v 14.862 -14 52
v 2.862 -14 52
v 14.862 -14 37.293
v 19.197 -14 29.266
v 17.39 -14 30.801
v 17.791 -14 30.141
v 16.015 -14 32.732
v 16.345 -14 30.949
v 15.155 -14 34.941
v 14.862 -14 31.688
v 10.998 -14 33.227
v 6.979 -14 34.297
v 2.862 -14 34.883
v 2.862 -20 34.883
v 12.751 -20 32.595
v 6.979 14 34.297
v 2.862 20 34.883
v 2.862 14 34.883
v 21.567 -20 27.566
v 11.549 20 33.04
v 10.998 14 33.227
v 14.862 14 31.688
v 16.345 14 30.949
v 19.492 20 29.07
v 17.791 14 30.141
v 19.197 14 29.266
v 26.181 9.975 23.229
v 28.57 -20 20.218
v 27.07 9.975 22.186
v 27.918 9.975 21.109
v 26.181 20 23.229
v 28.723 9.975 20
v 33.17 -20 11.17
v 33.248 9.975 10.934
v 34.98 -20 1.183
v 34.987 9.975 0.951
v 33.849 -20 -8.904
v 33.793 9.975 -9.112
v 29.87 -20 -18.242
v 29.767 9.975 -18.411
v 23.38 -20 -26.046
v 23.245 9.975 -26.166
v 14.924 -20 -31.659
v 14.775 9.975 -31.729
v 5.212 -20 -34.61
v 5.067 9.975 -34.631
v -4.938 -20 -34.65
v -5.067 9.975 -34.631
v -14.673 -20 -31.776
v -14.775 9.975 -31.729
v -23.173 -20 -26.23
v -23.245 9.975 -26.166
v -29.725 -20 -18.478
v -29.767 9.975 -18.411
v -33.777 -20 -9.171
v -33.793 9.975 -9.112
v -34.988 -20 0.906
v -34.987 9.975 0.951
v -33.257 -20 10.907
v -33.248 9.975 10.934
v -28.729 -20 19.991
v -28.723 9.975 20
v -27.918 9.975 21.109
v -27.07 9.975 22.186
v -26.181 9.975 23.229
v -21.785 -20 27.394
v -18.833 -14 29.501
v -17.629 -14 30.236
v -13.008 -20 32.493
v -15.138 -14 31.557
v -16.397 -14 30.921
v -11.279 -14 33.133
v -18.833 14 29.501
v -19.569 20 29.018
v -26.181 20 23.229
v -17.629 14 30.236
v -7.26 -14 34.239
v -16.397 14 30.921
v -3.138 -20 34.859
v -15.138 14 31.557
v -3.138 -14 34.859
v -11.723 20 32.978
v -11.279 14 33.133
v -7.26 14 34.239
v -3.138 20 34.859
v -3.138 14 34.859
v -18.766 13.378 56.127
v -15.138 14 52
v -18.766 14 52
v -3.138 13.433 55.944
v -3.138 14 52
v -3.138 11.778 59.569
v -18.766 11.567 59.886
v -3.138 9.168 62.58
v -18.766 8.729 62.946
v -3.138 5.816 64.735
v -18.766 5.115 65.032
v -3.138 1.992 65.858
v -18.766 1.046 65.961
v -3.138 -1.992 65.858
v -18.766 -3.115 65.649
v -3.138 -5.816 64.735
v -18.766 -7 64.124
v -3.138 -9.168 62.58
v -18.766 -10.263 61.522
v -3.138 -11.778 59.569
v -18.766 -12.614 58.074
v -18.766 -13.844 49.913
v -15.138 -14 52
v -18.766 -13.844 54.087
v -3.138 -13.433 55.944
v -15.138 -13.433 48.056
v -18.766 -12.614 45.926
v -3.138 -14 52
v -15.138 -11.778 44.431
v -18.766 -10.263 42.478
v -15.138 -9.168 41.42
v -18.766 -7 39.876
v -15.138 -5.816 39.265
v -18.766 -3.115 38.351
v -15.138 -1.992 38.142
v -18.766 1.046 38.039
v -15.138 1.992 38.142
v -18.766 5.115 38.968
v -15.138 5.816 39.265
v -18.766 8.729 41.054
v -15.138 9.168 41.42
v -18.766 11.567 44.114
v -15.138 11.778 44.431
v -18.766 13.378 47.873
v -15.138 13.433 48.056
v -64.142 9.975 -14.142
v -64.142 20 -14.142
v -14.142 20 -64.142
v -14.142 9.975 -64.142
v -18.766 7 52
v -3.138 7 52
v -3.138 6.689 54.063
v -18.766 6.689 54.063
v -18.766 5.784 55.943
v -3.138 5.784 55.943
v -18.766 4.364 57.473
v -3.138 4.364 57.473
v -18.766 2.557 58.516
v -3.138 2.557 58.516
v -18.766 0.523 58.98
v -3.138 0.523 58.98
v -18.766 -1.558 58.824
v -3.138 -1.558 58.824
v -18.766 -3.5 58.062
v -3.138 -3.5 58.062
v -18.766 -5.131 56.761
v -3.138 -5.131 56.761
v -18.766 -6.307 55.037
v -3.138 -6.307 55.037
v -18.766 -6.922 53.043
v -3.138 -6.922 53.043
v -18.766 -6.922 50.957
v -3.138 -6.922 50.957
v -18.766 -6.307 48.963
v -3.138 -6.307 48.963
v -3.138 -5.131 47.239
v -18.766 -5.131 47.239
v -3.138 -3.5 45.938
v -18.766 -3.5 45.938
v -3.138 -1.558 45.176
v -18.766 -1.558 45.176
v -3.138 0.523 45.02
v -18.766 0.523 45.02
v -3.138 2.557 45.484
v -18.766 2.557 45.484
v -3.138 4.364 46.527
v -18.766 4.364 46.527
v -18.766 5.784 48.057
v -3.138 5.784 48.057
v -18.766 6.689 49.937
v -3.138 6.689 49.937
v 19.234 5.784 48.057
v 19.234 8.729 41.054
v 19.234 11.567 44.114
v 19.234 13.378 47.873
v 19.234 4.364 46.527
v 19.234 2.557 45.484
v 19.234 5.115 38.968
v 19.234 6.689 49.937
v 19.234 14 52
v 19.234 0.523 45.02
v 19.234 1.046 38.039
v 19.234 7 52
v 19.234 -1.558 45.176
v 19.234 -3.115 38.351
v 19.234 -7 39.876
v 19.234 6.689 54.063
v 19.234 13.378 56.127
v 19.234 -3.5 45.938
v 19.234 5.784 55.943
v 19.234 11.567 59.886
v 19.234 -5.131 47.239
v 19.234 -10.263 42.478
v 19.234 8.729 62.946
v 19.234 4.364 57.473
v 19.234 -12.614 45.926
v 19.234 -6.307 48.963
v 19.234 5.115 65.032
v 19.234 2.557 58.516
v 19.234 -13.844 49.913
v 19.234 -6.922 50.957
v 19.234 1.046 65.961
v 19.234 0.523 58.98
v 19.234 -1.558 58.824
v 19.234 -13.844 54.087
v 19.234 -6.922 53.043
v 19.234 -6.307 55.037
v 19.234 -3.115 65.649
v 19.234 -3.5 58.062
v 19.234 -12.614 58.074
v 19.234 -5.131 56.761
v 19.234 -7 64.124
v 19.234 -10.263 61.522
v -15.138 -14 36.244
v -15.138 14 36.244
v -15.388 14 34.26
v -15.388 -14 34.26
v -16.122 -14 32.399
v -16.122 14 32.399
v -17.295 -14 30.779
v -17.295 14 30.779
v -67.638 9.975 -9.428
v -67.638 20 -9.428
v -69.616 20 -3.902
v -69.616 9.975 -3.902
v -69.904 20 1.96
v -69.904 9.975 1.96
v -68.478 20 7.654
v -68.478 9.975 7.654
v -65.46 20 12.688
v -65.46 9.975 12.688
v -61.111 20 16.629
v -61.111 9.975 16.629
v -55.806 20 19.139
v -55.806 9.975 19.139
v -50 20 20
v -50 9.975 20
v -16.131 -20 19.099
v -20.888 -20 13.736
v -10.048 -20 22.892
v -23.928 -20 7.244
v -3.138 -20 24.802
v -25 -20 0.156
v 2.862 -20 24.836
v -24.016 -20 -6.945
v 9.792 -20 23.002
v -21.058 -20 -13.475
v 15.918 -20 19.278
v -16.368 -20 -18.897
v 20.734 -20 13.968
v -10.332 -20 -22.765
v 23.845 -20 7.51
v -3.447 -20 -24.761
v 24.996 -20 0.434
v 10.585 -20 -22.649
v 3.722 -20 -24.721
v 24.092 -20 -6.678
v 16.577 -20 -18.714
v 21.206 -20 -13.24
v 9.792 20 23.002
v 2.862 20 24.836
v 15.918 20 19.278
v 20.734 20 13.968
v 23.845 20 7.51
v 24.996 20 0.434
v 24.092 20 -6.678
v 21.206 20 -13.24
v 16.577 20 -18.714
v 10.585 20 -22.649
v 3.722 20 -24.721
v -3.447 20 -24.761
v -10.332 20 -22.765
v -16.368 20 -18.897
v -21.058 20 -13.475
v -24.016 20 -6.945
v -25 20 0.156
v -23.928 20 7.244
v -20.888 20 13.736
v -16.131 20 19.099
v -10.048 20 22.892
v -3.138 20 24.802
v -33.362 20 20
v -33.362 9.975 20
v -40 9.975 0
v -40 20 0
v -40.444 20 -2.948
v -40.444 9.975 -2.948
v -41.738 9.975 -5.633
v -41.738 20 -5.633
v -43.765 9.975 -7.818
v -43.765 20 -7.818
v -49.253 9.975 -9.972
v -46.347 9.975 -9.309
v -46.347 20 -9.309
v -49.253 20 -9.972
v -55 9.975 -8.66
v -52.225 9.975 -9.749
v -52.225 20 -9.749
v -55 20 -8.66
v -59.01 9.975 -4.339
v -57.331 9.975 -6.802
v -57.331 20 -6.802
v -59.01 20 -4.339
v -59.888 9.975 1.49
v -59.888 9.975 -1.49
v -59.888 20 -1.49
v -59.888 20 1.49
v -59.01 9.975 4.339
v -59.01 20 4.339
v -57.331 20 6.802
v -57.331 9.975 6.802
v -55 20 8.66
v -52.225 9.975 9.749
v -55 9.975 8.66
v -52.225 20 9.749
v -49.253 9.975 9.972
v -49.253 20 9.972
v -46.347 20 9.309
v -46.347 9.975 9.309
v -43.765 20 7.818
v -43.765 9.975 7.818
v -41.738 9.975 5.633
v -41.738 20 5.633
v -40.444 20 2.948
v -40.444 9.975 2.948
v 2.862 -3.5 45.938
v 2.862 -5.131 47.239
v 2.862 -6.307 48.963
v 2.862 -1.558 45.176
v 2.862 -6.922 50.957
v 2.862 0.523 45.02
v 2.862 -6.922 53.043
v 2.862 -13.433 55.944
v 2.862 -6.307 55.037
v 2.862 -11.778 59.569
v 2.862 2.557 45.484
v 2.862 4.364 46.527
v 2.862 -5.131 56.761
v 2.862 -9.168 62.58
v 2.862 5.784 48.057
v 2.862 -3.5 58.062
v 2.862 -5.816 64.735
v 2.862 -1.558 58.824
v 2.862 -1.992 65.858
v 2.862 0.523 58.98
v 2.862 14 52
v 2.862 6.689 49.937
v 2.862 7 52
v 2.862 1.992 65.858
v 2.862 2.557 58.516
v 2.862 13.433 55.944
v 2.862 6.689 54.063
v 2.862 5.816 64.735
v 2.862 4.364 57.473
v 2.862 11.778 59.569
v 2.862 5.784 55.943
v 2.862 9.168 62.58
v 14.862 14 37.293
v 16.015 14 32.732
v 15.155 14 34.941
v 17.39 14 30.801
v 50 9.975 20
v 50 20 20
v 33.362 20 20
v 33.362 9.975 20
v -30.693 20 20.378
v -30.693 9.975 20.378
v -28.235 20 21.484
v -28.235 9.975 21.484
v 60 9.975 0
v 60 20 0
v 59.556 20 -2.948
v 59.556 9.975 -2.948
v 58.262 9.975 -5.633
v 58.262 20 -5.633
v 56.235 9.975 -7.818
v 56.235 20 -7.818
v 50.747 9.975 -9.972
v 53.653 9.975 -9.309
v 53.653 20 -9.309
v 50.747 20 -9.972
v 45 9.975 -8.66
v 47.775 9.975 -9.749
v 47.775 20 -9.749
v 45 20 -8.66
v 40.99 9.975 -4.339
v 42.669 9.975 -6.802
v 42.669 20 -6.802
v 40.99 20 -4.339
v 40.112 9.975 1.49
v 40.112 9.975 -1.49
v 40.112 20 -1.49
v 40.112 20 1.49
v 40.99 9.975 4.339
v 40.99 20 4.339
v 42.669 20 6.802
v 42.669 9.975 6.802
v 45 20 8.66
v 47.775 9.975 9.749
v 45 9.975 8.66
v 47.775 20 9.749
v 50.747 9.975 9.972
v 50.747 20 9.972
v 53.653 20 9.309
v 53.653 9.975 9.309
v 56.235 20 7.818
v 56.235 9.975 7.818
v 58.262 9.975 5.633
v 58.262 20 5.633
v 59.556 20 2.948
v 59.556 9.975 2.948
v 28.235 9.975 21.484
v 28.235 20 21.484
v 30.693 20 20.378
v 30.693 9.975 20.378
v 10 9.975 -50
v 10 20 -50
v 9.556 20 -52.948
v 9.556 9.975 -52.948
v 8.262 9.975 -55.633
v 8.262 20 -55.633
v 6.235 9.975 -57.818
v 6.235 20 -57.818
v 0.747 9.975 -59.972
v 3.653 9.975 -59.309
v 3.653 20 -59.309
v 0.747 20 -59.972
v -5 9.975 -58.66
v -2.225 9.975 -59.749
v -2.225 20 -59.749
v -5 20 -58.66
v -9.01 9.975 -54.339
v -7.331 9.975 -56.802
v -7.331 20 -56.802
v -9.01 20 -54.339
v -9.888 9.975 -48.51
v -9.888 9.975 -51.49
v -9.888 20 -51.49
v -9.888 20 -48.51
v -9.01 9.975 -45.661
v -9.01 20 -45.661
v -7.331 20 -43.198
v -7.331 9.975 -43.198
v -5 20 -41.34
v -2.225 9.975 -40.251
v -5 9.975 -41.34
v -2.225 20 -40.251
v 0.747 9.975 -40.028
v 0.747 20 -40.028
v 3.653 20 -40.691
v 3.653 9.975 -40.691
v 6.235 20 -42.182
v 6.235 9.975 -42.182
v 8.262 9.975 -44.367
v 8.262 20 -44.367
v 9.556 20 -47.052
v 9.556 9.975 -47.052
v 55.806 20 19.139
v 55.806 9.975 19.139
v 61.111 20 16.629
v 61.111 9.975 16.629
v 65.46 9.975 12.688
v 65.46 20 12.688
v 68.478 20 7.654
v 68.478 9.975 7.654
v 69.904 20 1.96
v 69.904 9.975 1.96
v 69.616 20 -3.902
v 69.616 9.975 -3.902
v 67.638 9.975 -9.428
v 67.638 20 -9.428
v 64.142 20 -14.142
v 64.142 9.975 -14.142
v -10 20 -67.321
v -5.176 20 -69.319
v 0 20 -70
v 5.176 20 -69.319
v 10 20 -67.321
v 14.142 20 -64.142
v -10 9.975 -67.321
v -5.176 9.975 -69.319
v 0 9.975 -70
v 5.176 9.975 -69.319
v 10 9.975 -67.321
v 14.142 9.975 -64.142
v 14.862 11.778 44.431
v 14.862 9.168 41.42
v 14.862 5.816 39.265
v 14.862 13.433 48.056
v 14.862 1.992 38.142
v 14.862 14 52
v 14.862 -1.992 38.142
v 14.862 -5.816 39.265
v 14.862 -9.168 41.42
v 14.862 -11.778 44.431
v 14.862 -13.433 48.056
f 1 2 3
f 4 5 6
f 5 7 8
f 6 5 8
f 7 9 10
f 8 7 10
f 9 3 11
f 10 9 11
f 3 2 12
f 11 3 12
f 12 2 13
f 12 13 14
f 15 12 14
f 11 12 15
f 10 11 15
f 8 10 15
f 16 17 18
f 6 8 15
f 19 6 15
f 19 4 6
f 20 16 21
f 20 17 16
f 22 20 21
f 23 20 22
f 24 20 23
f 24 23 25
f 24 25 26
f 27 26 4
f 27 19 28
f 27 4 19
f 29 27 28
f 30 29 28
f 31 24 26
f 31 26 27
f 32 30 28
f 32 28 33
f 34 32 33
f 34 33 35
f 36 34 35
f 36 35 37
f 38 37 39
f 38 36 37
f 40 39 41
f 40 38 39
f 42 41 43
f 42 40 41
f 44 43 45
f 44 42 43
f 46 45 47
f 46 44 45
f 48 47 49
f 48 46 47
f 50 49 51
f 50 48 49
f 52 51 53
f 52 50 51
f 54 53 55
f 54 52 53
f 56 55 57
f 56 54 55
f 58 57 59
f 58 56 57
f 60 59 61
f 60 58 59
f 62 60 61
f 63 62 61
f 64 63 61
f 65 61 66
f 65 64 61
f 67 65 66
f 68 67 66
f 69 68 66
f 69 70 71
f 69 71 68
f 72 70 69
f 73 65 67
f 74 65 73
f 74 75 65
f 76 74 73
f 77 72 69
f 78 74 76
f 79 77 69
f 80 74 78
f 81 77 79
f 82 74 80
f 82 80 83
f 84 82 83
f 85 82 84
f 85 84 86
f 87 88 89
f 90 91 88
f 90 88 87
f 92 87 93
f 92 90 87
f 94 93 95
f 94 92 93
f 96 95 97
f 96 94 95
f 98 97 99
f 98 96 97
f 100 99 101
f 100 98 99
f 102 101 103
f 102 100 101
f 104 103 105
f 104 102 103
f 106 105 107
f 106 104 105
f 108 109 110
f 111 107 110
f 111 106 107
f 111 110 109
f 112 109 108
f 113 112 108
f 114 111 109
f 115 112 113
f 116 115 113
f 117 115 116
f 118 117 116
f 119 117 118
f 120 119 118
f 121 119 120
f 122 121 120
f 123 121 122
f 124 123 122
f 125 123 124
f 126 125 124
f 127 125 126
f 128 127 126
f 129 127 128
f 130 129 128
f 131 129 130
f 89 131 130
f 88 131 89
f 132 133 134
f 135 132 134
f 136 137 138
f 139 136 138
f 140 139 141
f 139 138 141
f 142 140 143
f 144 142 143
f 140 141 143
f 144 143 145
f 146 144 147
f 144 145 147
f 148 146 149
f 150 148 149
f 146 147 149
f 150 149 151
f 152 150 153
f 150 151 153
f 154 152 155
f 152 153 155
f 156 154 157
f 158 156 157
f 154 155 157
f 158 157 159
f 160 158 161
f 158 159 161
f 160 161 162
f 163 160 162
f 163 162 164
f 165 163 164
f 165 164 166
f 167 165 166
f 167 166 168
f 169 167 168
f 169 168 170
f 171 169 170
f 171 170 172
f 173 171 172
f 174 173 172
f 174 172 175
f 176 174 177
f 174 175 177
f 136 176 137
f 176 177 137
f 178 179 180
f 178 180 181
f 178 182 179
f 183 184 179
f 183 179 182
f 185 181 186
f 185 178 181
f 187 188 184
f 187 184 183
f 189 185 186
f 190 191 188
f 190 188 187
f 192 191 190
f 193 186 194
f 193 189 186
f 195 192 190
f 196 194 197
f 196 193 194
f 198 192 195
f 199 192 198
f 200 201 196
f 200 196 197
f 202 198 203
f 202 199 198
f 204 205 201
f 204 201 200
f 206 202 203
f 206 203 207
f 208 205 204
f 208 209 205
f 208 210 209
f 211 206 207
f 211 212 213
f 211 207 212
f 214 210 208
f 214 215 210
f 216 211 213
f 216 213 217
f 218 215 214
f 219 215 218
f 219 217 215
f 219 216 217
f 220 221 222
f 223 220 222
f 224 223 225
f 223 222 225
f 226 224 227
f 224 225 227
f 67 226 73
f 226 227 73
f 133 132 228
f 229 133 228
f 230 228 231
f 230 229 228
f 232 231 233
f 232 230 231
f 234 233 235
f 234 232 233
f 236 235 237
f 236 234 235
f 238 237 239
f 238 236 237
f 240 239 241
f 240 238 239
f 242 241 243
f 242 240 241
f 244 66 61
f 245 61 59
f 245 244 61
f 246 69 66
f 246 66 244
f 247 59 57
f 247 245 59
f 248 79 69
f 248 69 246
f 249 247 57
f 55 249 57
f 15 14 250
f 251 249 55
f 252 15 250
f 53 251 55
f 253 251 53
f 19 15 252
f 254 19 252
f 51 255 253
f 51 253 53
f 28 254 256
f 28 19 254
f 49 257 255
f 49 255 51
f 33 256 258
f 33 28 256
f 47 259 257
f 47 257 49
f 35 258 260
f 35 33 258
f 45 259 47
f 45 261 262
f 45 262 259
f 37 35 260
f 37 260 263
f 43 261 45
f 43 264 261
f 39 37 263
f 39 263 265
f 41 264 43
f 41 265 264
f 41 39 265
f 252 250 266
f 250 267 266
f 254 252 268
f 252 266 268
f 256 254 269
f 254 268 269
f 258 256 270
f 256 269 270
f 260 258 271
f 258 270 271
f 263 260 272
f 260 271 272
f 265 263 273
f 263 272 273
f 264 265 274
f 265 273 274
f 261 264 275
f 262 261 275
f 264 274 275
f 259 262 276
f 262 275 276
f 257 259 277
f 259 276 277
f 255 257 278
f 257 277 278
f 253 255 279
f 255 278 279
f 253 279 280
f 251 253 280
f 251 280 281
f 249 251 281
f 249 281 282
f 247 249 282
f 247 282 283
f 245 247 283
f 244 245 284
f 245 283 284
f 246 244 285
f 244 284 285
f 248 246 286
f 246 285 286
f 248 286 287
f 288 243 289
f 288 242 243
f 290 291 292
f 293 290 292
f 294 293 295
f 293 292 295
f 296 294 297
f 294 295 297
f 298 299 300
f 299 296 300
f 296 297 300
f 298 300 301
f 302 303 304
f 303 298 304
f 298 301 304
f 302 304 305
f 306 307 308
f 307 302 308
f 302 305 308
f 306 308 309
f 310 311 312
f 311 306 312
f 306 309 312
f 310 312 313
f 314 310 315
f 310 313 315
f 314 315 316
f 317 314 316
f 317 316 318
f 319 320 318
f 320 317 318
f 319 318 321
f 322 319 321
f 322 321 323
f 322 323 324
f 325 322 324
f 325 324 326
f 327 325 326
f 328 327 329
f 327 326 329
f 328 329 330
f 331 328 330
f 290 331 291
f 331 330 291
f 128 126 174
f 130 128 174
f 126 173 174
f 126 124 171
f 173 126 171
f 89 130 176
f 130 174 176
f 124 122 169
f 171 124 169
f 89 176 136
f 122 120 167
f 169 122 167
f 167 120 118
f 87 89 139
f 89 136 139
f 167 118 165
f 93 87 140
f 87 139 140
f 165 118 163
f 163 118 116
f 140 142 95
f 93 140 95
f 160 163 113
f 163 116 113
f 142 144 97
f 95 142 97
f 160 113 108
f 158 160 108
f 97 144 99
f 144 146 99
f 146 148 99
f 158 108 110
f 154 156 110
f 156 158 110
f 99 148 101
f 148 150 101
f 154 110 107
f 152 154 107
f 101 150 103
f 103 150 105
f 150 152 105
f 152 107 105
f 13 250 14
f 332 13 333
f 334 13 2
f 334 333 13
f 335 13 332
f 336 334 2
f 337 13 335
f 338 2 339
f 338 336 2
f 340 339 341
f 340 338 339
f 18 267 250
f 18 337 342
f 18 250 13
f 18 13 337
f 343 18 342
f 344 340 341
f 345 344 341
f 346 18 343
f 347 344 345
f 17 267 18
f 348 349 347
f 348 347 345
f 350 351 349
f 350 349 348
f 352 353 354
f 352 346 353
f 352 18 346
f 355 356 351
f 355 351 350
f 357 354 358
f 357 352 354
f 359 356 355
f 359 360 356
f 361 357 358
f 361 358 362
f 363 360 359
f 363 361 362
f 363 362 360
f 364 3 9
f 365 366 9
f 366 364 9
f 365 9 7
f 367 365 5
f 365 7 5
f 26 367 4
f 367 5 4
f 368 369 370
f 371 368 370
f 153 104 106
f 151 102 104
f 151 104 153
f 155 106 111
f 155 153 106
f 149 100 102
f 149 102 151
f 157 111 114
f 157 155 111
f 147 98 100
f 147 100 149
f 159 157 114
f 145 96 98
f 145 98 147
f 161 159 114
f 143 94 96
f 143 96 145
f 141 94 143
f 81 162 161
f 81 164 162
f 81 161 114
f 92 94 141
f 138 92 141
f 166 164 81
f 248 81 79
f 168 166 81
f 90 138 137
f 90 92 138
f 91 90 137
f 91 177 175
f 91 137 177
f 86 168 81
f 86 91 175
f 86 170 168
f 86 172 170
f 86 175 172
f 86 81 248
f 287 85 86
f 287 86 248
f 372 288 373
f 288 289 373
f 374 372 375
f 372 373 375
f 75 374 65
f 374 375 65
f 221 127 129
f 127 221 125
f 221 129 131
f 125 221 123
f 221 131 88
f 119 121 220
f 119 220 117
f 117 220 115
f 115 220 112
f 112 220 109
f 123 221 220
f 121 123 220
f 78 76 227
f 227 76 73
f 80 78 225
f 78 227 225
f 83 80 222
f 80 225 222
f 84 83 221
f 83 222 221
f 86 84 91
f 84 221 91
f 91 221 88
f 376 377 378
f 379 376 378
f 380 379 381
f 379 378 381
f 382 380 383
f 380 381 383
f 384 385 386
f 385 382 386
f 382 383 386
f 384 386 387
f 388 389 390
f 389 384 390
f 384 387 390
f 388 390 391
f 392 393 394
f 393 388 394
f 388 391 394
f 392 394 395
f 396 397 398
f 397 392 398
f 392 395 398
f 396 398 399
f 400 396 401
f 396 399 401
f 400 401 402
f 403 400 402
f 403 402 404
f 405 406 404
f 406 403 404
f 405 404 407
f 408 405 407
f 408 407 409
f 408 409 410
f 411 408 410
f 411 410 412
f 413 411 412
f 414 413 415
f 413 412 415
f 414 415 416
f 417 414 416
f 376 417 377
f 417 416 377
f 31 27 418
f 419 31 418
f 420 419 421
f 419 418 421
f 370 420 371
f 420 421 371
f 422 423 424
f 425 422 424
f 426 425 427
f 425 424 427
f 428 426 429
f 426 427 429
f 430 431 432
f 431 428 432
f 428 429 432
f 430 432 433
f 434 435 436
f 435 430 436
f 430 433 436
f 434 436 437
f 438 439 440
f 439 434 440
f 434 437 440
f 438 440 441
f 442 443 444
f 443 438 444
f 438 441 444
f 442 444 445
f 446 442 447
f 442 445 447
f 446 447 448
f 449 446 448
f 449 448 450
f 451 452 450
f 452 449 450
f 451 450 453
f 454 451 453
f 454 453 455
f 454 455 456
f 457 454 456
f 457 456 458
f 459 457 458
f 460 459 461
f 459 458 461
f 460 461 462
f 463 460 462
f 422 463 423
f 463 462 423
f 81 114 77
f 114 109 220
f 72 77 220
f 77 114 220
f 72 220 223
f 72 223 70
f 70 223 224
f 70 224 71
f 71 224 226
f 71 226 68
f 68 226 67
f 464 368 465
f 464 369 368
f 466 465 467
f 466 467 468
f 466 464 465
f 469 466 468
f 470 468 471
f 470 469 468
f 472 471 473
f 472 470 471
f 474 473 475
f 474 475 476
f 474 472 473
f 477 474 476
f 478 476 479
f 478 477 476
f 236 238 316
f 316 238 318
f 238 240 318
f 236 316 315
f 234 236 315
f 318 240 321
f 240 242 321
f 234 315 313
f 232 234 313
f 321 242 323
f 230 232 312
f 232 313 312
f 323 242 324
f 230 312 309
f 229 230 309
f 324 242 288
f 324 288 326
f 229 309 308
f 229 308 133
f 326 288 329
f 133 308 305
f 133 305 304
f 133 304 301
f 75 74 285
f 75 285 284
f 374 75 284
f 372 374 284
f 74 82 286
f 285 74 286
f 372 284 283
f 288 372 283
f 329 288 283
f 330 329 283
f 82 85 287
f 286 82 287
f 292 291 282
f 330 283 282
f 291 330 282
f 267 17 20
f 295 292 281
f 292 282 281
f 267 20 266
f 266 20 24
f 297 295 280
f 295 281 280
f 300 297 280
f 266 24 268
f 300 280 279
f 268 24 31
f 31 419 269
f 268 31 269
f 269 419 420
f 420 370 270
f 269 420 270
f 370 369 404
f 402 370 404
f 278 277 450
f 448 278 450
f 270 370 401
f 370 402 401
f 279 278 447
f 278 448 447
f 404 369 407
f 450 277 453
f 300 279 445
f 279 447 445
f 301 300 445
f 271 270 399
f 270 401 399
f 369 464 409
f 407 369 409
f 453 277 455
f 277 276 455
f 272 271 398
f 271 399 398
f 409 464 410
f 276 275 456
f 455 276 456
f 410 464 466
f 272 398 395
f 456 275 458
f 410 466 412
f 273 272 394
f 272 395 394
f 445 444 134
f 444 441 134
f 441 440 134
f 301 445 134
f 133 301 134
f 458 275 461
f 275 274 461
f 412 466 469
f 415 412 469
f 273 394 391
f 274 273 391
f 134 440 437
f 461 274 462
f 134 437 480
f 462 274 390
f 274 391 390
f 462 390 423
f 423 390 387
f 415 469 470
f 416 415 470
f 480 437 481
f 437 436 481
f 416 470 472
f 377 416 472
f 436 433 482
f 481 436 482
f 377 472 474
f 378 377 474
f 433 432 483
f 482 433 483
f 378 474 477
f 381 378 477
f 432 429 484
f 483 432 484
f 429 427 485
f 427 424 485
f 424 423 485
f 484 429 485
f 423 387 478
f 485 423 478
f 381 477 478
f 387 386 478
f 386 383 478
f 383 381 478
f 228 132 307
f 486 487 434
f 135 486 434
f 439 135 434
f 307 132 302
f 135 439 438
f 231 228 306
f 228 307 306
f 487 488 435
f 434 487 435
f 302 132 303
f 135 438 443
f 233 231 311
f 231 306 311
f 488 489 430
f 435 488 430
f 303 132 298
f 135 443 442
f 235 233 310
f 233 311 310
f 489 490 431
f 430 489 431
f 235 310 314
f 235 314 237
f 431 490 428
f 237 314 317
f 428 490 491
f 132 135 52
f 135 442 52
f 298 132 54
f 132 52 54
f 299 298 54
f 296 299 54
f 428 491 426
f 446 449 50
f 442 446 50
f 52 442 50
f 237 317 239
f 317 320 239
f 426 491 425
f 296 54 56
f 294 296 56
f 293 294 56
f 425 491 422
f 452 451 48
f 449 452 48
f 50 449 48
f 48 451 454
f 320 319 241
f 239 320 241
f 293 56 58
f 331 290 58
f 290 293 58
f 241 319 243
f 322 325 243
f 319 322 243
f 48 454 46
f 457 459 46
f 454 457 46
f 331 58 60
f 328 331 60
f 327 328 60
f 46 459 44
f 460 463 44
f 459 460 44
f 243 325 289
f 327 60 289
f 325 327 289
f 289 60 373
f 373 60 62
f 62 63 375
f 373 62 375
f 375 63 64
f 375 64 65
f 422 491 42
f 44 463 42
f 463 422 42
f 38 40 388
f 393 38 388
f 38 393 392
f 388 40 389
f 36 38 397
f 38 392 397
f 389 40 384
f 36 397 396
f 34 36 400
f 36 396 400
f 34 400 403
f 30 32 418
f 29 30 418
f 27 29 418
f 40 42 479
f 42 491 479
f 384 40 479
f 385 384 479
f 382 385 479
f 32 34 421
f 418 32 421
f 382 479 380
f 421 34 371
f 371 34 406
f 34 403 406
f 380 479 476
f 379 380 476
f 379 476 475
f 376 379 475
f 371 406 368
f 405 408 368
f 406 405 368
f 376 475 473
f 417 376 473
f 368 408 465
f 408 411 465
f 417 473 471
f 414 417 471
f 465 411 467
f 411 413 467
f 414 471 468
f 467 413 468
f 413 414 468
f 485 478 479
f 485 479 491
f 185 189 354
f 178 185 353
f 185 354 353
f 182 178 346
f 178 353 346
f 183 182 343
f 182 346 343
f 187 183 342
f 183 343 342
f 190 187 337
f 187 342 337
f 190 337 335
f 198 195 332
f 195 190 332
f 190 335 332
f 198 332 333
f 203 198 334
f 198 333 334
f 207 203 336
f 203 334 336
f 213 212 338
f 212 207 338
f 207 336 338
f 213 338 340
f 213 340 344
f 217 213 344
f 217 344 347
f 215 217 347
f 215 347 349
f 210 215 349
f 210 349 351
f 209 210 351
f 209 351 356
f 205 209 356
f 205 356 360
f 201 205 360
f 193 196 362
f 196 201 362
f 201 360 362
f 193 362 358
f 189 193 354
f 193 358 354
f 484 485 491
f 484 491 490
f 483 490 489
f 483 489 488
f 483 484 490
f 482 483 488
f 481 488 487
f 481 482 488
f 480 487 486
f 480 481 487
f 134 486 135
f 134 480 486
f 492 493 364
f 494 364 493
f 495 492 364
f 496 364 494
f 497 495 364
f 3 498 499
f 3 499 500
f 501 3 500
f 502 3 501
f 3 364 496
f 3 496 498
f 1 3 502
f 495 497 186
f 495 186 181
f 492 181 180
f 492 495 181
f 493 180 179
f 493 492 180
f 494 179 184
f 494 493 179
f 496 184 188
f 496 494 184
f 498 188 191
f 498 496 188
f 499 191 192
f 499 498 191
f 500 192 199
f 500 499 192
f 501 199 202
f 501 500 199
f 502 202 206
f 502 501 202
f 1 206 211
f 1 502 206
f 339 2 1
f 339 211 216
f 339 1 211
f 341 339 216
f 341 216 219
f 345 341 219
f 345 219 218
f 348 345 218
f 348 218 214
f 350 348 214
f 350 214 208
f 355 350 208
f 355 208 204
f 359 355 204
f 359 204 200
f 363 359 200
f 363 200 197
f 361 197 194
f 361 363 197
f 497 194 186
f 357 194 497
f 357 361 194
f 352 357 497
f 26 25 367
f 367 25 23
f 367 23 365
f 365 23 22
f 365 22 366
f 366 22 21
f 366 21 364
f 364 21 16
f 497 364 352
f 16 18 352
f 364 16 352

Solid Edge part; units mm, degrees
sketch "Sketch1" plane through (0, 0, 0) normal (0, -1, 0) x (1, 0, 0)
  circle A0 centre (0, 0) radius 35
  circle A1 centre (0, 0) radius 25
  dimension "D1" = 70
  dimension "D2" = 50
extrude "ProtrusioneEstrusa_1" add sketch "Sketch1" along normal mid plane 40
sketch "Sketch2" plane through (-0.138, 0, 0) normal (1, 0, 0) x (0, 1, 0)
  line L0 (-14, 30) -> (14, 30)
  line L1 (14, 30) -> (14, 52)
  arc A0 (14, 52) -> (-14, 52) centre (0, 52) cw
  line L2 (-14, 52) -> (-14, 30)
extrude "ScavoEstrusione_1" add sketch "Sketch2" along normal mid plane 30
sketch "Sketch3" plane through (0.2337, 0, 0) normal (1, 0, 0) x (0, 1, 0)
  circle A0 centre (0, 52) radius 7
  circle A1 centre (0, 52) radius 14
  dimension "D1" = 28
  dimension "D2" = 14
  dimension "D3" = 52
extrude "ProtrusioneEstrusa_3" add sketch "Sketch3" along normal mid plane 38
sketch "Sketch4" plane through (0, 0.4135, 0) normal (0, -1, 0) x (1, 0, 0)
  line L0 (2.862, 22) -> (2.862, 82)
  line L1 (2.862, 82) -> (-3.138, 82)
  line L2 (-3.138, 82) -> (-3.138, 22)
  line L3 (-3.138, 22) -> (2.862, 22)
extrude "ScavoEstrusione_2" cut sketch "Sketch4" along normal mid plane 100.3367
sketch "Sketch5" plane through (0, 20, 0) normal (0, -1, 0) x (1, 0, 0)
  arc A0 (50, 20) -> (64.1421, -14.1421) centre (50, 0) cw
  line L0 (64.1421, -14.1421) -> (14.1421, -64.1421)
  arc A1 (14.1421, -64.1421) -> (-14.1421, -64.1421) centre (0, -50) cw
  line L1 (-64.1421, -14.1421) -> (-14.1421, -64.1421)
  arc A2 (-50, 20) -> (-64.1421, -14.1421) centre (-50, 0) ccw
  line L2 (-50, 20) -> (-28.7228, 20)
  arc A3 (28.7228, 20) -> (-28.7228, 20) centre (0, 0) cw
  line L3 (50, 20) -> (28.7228, 20)
  circle A4 centre (-50, 0) radius 10
  circle A5 centre (50, 0) radius 10
  circle A6 centre (0, -50) radius 10
extrude "ProtrusioneEstrusa_5" add sketch "Sketch5" along normal blind 10.0252
fillet "Raccordo_1" radius 8 1 edges at (-15.138, 0, 31.5569)
fillet "Raccordo_2" radius 9.6 3 edges at (-28.7228, 14.9874, 20) (28.7228, 14.9874, 20) (14.862, 0, 31.6879)
properties material "Acciaio"
